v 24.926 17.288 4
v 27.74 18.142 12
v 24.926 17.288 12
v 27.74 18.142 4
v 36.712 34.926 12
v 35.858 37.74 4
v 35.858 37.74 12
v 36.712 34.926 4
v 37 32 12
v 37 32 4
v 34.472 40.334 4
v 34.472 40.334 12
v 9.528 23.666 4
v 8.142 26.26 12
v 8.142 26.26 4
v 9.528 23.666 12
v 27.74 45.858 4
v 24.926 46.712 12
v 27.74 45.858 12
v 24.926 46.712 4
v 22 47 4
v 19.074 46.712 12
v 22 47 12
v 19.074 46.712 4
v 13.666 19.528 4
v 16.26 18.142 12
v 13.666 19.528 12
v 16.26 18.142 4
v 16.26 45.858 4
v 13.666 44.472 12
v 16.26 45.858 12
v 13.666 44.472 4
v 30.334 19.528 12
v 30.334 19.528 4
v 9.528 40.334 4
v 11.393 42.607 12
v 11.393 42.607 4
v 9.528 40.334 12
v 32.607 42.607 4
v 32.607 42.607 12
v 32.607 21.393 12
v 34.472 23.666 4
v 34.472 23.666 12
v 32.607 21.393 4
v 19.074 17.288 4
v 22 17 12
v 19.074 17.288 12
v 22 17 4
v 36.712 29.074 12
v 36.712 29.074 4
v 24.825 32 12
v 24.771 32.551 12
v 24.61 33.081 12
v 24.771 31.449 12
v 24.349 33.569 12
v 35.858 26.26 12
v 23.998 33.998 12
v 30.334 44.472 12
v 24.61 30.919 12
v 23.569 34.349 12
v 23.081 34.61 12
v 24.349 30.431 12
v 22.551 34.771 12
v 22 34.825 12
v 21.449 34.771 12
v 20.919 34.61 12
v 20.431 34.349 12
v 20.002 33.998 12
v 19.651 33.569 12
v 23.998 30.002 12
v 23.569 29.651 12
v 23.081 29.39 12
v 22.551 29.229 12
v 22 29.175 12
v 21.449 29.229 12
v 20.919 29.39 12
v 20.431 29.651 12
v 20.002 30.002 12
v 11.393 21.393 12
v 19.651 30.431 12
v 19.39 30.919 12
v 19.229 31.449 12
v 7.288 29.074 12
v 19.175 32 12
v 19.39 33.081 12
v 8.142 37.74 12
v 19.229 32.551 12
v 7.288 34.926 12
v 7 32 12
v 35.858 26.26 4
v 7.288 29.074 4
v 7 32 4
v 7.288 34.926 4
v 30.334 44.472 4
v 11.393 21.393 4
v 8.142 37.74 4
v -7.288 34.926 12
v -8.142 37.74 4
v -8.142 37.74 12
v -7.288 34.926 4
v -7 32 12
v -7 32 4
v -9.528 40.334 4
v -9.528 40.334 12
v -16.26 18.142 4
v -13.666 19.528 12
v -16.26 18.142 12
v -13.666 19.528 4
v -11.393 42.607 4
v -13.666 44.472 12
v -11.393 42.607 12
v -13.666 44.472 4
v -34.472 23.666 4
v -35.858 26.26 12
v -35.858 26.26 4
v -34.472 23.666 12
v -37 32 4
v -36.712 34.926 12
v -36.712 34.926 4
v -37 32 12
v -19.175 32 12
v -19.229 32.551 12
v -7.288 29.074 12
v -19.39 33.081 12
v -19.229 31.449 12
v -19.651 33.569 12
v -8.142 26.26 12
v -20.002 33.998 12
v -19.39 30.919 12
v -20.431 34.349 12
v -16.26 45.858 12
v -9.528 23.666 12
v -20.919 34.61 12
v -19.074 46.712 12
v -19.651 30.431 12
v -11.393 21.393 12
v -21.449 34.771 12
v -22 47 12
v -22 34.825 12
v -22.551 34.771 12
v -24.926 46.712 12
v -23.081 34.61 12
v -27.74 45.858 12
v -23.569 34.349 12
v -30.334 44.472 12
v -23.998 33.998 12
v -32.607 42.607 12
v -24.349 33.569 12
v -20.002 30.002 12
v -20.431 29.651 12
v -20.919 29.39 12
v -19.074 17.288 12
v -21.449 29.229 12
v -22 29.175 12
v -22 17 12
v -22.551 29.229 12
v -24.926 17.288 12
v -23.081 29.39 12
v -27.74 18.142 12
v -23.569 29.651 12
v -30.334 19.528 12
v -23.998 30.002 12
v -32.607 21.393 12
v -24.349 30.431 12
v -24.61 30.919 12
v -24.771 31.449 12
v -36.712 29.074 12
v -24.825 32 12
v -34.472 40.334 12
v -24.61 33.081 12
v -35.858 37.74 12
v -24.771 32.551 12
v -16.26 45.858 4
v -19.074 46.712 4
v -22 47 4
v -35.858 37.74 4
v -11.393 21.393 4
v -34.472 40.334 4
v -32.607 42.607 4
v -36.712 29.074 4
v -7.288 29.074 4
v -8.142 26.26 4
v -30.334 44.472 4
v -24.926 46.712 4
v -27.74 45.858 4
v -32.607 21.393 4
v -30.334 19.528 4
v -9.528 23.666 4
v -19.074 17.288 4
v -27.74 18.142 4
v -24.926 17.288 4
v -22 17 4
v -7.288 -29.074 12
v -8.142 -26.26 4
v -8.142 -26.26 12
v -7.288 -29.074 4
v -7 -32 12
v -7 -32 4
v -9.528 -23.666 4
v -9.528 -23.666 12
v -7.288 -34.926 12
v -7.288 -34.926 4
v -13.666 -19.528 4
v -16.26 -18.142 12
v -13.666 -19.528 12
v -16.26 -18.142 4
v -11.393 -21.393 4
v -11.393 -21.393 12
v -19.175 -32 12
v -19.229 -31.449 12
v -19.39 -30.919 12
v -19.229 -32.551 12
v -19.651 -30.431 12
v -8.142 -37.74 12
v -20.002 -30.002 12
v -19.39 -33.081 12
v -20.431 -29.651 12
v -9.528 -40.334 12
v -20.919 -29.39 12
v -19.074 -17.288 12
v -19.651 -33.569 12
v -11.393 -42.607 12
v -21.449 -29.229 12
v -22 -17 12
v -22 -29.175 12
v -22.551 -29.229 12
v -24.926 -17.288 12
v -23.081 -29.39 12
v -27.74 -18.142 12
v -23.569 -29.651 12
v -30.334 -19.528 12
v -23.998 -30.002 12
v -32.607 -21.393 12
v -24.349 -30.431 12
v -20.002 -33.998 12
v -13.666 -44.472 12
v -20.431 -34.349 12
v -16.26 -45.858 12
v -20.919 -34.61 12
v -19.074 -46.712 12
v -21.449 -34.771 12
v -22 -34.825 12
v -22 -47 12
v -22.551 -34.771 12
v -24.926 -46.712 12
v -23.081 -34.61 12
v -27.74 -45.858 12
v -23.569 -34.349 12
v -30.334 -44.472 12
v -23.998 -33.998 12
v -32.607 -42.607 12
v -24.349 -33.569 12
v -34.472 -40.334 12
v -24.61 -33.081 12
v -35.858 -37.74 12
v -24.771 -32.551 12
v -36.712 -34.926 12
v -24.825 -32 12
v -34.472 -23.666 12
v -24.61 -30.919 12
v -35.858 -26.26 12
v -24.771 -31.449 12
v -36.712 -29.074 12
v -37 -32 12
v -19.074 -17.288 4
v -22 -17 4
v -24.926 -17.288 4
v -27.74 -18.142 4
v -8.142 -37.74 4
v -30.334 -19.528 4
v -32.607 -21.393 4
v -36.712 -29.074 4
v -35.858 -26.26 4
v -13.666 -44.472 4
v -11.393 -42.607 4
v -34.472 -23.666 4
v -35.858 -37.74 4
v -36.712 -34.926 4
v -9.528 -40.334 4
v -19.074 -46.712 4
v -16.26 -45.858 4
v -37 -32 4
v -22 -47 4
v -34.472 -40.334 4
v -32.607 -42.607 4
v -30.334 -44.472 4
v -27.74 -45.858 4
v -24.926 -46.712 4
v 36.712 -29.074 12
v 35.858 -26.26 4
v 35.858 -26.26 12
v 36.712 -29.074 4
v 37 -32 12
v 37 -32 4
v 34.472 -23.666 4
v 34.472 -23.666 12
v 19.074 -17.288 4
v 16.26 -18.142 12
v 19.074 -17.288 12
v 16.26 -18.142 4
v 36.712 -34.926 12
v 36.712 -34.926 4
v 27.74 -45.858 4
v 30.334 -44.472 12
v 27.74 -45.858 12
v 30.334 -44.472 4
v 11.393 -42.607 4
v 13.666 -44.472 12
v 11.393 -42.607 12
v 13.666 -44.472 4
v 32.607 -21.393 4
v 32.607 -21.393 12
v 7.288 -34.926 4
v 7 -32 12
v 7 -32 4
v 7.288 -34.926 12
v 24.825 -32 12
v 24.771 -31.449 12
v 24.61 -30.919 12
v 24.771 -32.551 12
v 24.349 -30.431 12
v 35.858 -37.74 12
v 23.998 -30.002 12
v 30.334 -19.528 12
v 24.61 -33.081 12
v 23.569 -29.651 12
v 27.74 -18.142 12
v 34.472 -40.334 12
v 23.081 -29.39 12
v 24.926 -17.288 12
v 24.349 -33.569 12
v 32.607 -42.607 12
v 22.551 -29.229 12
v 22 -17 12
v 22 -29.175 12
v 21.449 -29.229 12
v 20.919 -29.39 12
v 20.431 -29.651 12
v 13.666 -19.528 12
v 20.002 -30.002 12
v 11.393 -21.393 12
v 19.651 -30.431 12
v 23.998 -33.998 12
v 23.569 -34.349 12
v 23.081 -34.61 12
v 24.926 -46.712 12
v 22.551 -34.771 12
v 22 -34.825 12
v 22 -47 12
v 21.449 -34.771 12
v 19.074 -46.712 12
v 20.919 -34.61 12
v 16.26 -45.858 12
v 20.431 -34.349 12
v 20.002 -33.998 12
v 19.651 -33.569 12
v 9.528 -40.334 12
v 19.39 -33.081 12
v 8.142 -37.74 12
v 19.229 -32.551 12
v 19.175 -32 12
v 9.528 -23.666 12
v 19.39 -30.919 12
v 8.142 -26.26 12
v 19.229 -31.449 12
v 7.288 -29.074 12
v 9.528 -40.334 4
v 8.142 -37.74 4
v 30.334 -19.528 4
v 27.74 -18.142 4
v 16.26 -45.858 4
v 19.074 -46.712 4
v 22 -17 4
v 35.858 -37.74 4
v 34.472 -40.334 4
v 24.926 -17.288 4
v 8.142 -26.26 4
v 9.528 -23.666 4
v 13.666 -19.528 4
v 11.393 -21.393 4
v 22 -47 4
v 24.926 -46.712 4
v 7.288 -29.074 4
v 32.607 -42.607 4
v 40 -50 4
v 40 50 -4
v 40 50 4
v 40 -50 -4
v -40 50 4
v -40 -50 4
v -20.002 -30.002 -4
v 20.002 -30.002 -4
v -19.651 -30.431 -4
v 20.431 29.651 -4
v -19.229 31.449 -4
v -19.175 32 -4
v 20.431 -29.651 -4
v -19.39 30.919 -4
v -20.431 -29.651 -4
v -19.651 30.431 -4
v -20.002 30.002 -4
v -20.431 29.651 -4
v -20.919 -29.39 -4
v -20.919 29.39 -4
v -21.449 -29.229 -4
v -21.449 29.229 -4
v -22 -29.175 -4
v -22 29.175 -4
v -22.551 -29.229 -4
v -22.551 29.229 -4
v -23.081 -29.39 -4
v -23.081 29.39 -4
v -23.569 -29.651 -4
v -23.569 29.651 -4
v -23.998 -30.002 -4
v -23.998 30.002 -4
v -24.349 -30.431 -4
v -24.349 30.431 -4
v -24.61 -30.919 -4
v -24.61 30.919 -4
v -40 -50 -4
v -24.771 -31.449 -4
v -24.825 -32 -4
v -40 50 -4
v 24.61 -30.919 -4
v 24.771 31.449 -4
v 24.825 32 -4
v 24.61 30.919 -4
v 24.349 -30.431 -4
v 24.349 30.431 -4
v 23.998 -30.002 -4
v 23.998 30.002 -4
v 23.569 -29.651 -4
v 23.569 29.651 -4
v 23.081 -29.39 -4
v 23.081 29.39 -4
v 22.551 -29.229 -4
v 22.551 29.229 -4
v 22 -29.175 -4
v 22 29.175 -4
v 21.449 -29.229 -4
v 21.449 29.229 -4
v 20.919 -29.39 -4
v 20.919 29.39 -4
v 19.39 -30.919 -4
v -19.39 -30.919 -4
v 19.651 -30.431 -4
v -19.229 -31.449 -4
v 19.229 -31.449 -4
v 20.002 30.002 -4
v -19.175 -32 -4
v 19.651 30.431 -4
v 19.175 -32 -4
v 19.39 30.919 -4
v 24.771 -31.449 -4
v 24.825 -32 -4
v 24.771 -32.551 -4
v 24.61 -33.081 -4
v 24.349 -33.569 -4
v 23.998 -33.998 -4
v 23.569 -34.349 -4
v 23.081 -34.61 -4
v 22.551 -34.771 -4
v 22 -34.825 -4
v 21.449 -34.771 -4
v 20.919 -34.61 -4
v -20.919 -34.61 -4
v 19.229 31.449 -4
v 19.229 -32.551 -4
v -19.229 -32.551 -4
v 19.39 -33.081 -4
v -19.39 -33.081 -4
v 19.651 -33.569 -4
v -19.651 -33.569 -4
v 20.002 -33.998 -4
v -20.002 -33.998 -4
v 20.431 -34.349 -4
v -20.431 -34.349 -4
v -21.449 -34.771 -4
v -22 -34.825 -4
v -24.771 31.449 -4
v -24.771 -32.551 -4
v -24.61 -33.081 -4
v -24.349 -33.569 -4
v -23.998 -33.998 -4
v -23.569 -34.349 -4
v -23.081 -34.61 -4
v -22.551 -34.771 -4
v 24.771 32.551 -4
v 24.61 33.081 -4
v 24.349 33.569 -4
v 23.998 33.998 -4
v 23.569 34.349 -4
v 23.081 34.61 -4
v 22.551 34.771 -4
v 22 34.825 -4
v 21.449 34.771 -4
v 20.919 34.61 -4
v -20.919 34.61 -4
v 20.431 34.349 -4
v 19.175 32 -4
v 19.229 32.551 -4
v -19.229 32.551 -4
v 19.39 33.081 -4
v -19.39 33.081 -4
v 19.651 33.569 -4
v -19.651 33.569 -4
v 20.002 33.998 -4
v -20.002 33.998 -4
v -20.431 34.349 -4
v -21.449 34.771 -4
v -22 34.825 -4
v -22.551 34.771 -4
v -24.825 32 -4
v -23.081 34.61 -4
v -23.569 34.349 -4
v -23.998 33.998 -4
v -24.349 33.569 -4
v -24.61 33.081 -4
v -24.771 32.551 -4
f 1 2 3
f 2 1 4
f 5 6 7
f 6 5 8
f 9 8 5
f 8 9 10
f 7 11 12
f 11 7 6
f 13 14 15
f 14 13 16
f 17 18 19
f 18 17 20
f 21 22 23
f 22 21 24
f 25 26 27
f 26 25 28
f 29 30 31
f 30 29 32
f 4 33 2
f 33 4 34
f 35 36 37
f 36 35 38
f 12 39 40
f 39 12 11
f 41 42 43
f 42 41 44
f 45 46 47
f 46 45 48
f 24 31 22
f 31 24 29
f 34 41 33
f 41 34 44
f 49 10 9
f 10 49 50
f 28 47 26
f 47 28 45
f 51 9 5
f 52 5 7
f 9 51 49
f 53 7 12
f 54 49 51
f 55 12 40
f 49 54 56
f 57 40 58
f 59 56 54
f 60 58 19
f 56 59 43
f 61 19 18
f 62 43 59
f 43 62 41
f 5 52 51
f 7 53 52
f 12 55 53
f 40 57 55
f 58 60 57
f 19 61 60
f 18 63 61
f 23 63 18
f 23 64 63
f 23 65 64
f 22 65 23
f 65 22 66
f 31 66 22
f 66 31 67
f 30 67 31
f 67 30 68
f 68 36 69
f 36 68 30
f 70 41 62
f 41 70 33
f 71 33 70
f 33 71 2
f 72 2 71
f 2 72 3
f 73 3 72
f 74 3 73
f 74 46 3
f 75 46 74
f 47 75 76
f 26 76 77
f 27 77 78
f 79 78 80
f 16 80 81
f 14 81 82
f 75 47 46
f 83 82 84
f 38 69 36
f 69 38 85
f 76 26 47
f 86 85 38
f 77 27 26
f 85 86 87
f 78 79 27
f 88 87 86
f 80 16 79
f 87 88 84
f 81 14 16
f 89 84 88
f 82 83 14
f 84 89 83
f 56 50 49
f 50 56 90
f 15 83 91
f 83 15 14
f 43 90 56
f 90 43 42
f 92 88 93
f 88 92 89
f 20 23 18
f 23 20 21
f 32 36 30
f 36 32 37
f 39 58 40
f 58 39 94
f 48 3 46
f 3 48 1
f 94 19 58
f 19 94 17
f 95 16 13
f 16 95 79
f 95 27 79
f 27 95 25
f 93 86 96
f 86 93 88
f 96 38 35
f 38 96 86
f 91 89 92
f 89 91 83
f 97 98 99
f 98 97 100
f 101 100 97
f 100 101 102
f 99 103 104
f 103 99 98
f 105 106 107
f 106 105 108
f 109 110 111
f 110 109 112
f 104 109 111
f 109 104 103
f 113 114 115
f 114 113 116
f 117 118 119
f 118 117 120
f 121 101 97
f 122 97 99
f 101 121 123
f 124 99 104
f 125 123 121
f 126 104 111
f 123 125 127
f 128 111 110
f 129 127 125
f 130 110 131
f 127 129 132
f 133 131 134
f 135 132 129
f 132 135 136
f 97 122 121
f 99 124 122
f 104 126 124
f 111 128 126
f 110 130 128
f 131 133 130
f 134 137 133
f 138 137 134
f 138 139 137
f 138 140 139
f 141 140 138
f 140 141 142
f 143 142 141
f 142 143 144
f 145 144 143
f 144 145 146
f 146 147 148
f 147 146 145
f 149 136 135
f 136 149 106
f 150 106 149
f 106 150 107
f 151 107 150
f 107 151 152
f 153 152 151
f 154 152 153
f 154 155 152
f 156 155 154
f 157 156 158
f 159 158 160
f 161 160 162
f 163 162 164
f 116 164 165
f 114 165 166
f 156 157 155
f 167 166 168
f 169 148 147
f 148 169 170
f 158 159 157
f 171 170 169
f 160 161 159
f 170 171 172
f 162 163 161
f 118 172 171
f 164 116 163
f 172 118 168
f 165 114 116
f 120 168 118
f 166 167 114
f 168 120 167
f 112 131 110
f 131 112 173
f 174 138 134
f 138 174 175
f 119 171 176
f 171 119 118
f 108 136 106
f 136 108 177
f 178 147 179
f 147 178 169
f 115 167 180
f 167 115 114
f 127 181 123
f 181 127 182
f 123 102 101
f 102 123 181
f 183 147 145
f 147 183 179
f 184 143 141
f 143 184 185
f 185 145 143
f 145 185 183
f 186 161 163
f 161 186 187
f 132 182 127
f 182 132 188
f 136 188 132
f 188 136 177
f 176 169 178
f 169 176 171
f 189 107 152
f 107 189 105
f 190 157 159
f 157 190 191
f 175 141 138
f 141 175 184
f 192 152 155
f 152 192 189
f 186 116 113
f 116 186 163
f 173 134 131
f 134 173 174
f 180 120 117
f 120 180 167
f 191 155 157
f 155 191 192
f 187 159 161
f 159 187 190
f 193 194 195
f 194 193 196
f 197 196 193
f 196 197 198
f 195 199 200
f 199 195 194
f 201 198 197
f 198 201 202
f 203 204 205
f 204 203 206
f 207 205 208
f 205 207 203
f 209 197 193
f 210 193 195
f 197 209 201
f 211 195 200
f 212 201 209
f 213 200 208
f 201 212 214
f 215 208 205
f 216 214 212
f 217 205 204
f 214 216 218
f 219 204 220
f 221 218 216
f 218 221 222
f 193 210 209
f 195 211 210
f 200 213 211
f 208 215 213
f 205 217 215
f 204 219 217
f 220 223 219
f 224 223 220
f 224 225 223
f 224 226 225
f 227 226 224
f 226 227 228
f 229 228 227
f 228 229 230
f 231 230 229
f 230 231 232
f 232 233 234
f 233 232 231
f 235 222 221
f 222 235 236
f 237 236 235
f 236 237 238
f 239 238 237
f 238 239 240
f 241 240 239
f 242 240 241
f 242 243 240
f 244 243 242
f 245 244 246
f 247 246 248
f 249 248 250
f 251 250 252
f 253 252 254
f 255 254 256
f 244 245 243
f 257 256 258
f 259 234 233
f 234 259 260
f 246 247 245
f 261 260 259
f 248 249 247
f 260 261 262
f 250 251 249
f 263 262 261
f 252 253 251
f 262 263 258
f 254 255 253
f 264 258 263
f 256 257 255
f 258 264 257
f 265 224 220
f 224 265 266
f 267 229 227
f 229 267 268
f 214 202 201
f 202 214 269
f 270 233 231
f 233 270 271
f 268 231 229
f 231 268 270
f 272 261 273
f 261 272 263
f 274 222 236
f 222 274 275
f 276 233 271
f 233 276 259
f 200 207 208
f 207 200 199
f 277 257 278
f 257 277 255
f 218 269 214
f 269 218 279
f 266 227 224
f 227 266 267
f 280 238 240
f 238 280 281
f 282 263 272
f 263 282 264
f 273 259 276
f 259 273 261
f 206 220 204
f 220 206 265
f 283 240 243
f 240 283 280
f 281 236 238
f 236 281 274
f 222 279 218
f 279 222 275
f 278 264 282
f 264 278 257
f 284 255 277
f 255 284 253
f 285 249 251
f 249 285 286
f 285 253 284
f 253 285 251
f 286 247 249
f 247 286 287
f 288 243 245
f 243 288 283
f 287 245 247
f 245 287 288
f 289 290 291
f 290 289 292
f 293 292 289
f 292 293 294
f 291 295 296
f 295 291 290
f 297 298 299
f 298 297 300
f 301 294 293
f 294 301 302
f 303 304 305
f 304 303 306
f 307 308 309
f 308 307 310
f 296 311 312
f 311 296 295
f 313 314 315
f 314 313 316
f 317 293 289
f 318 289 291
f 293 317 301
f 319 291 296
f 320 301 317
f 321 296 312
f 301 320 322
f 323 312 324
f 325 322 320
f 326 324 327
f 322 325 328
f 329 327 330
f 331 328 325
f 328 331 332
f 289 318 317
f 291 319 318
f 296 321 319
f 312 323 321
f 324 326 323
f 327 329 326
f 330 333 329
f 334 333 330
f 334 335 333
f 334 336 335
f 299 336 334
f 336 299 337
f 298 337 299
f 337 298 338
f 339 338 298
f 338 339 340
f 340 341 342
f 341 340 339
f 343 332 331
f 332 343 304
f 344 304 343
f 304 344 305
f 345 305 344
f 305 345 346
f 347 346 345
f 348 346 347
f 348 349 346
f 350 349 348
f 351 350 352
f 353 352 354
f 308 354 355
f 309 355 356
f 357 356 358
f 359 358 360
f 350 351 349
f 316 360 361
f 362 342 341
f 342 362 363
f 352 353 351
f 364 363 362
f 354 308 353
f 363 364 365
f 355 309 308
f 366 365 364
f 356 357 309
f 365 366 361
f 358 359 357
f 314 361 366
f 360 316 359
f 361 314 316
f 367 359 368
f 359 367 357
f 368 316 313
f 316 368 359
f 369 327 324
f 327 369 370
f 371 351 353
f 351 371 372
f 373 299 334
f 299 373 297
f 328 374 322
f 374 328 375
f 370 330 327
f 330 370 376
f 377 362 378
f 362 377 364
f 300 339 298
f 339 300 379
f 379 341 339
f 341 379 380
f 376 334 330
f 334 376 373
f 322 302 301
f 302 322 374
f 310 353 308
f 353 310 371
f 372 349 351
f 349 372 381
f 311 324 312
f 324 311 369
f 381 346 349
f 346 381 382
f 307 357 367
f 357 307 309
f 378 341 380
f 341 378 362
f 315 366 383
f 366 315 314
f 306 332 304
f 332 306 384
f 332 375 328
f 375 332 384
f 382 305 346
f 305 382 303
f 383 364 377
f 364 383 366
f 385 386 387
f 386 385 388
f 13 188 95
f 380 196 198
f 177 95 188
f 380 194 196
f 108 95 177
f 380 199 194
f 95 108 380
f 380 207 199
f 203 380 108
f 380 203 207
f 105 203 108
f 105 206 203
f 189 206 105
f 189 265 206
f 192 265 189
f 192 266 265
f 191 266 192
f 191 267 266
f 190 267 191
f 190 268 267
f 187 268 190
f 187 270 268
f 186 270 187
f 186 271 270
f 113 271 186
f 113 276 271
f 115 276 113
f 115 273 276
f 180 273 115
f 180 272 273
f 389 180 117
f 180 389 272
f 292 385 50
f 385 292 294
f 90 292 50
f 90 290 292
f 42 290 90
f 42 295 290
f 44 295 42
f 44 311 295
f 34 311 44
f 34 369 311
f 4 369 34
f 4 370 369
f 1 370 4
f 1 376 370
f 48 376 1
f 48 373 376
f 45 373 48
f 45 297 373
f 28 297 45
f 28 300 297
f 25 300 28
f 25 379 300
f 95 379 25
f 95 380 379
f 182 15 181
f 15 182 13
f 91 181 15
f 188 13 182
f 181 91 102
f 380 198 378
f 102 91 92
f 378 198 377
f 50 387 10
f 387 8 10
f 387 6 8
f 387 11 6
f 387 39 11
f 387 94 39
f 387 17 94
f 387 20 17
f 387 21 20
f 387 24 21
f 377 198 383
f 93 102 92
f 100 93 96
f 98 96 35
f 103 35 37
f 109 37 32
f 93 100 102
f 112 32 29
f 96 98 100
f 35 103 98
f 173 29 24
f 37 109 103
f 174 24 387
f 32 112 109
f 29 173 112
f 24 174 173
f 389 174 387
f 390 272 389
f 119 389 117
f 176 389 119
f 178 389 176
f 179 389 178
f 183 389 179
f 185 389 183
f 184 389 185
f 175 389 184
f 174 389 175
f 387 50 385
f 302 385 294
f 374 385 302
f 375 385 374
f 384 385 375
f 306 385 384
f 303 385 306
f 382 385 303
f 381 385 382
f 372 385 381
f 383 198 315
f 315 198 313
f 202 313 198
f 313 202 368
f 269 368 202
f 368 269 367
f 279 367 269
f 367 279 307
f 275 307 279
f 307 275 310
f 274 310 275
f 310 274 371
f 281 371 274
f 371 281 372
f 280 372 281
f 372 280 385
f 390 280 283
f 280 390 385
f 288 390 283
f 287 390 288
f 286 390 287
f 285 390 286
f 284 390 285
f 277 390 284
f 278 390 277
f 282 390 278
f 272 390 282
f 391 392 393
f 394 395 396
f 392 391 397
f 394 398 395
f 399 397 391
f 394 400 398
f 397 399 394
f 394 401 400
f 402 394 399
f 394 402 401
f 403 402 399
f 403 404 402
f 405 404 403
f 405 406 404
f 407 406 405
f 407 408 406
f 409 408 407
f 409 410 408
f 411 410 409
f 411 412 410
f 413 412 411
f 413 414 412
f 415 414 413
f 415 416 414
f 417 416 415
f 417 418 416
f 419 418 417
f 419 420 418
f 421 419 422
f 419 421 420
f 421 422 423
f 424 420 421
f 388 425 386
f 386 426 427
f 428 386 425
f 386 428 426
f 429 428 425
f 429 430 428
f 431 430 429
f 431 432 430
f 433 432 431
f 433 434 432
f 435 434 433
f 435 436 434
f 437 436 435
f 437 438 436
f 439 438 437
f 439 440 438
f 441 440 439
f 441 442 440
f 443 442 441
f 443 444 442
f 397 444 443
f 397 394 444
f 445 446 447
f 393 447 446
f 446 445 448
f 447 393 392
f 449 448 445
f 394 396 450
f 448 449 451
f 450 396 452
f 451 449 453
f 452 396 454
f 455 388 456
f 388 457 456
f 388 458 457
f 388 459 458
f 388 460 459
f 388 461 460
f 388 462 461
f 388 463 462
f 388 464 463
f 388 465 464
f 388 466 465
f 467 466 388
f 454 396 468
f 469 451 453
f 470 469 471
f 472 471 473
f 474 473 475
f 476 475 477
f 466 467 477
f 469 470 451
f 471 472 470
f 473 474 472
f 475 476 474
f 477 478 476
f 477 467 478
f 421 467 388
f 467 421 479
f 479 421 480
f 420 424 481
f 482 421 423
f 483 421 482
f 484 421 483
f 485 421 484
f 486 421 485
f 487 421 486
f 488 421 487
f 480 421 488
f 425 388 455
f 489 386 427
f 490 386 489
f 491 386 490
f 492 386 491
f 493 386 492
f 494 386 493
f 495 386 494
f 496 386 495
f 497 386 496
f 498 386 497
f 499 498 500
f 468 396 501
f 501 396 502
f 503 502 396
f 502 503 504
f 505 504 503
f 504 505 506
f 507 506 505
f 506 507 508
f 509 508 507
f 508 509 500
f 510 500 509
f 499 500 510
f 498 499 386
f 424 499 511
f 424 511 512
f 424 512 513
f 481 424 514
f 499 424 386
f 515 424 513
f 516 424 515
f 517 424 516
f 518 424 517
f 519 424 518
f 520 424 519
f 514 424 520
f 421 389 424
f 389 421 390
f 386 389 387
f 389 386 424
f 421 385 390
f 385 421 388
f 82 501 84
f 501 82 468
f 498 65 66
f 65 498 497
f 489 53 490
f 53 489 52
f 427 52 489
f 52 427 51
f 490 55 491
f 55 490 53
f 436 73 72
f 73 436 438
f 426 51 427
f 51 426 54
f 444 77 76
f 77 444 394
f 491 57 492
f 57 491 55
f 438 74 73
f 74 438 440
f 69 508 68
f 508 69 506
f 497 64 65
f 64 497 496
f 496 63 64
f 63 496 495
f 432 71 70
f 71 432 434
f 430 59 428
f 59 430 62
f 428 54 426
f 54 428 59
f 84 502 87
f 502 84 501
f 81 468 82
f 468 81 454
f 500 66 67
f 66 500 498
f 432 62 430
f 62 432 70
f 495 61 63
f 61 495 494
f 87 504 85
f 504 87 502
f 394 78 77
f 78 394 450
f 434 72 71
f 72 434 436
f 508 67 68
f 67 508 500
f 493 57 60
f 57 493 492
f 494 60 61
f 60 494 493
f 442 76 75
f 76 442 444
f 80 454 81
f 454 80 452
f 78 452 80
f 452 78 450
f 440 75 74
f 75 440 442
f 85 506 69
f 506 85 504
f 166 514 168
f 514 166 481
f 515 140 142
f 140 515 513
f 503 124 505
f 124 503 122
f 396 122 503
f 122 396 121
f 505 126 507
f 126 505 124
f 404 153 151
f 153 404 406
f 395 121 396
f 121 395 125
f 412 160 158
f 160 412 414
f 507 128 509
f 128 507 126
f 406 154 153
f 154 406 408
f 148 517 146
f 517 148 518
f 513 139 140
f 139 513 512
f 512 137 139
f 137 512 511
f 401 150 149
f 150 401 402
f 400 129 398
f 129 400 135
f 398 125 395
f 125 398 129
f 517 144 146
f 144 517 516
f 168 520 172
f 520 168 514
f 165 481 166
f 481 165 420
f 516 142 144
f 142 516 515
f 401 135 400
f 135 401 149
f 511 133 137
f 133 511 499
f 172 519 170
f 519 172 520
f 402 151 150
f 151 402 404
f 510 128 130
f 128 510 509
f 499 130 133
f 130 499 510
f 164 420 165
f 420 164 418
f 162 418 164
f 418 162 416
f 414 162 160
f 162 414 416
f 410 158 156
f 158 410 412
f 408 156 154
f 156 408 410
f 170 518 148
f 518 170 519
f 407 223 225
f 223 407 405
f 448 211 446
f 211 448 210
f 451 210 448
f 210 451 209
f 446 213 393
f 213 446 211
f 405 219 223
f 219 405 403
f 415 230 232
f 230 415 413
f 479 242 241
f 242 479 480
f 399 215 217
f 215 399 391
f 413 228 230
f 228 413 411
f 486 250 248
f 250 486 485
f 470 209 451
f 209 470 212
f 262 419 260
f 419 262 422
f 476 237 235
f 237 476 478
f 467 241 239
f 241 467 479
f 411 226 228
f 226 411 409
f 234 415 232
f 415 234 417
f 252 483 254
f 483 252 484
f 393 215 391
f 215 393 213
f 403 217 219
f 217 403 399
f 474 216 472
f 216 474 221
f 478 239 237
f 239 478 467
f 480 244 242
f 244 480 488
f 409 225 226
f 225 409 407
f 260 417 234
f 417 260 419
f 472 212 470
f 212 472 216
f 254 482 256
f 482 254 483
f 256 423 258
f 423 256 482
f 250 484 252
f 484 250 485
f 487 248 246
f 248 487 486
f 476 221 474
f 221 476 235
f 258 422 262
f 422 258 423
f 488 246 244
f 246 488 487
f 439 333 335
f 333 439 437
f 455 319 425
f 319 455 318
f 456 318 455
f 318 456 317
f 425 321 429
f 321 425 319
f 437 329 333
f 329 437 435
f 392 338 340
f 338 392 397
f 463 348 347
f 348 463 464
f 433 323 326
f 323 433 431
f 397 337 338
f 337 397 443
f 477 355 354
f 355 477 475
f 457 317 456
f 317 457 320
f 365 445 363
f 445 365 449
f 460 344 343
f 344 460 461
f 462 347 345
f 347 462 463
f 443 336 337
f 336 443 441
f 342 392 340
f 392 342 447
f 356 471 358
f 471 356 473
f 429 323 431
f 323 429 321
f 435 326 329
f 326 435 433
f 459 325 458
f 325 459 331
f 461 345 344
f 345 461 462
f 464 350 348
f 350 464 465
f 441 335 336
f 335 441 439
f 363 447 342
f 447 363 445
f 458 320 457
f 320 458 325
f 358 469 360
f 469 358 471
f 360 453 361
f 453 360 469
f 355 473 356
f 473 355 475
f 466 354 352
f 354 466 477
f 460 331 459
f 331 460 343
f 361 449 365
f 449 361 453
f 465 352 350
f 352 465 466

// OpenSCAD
$fn = 32;

// ----------------------------------------------------------------------
// Anchor pads 80 x 100 x 16
// four corner bosses with anchor holes
// ----------------------------------------------------------------------

// --- parameters (mm) ---
plate = [80, 100, 8];    // base plate size (x, y, z)
pads = 4;                // boss count, one per corner
edge = 18;               // boss centre offset from the plate edge
boss_d = 30;             // boss diameter
boss_h = 8;              // boss height above the base plate
bore_d = 5.5;            // nominal hole diameter from the drawing
print_allowance = 0.15;  // clearance added for printing

// --- derived feature positions (mm) ---
hole_d = bore_d + print_allowance;  // = 5.65   hole diameter as printed
height = plate[2] + boss_h;         // = 16   overall height of the part
corner_x = plate[0] / 2 - edge;     // = 22   boss centre X
corner_y = plate[1] / 2 - edge;     // = 32   boss centre Y
feature_centers = [
  [corner_x, corner_y],
  [-corner_x, corner_y],
  [-corner_x, -corner_y],
  [corner_x, -corner_y]
];   // boss centres, anchor holes are drilled there

// base plate, four bosses standing on it, anchor holes all the way through
difference() {
  union() {
    cube(plate, center = true);
    for (centre = feature_centers)
      translate([centre[0], centre[1], plate[2] / 2 - 1])
        cylinder(d = boss_d, h = boss_h + 1);
  }
  for (centre = feature_centers)
    translate([centre[0], centre[1], -height])
      cylinder(d = hole_d, h = 2 * height + 2);  // through boss and plate
}
